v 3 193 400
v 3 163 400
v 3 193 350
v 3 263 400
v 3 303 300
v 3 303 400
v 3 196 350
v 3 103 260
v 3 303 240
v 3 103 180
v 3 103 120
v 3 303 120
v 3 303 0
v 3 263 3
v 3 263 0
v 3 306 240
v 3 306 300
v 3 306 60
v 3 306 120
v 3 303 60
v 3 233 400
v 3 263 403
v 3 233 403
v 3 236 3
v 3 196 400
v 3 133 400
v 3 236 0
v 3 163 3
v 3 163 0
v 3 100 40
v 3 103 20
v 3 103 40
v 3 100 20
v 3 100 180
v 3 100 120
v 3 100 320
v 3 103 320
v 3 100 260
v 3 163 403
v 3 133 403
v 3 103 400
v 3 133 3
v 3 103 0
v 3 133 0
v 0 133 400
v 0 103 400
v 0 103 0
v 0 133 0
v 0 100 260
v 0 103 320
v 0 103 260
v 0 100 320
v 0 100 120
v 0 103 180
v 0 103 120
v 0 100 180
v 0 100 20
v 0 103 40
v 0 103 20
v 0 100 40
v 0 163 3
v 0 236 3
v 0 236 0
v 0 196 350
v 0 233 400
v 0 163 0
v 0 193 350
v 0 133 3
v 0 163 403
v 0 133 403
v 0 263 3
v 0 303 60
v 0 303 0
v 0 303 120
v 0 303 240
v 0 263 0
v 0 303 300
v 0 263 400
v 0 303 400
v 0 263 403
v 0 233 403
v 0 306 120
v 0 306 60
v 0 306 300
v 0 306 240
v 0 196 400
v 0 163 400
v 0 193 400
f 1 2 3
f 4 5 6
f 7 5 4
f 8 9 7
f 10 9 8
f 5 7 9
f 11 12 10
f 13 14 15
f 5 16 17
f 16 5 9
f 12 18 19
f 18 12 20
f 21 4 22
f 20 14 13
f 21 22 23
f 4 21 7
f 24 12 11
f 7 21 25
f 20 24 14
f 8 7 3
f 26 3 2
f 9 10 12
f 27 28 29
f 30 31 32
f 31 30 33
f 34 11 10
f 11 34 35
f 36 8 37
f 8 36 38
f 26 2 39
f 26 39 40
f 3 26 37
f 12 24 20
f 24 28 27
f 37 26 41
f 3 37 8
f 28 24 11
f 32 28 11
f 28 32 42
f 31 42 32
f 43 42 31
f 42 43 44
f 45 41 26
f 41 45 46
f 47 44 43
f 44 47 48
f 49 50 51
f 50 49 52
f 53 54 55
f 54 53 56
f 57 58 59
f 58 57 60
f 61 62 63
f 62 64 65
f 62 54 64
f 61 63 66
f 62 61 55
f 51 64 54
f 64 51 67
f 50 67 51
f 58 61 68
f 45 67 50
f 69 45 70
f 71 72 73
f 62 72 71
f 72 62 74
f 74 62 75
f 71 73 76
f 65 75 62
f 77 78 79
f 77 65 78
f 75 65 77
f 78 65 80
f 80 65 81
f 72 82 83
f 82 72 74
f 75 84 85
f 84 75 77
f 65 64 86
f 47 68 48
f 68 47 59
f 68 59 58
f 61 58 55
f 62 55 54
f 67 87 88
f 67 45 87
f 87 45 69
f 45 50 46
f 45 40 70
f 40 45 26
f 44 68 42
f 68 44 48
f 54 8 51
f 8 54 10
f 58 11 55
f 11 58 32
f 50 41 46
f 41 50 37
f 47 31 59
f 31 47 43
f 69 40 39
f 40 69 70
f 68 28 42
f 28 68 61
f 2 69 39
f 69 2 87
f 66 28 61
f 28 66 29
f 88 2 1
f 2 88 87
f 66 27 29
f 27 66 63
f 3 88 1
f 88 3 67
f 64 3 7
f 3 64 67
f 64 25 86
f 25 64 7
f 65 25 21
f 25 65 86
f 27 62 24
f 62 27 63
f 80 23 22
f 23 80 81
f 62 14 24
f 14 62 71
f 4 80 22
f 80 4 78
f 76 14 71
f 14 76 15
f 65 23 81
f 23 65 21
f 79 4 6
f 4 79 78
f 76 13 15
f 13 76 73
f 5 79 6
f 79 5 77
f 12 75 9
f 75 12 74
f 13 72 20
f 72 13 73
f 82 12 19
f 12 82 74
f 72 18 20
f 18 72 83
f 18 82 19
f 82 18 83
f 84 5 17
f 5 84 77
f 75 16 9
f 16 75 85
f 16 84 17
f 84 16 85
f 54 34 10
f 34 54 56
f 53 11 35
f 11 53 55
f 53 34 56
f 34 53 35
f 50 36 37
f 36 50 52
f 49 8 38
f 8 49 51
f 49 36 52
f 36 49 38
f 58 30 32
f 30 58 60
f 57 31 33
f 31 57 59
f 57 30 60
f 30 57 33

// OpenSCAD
module part03 (){
    // high part
    translate([0,103,0]) color ("red") cube([3,30,400]);
    translate([0,133,3]) color ("red") cube([3,30,400]);
    // middle part
    translate([0,163,0])color("red") cube([3,30,400]);
    //einkerbung
    translate([0,193,0])color("red") cube([3,3,350]);
    translate([0,196,0])color("red") cube([3,40,400]);
    translate([0,233,3])color("red") cube([3,30,400]);
    translate([0,263,0]) color("red") cube([3,40,400]);
    translate([0,303,60])color("red")cube([3,3,60]);
    translate([0,303,240])color("red")cube([3,3,60]);
    translate([0,100,120])color("red")cube([3,3,60]);
    translate([0,100,260])color("red")cube([3,3,60]);
    
    // pin part03a
    translate([0,100,20]) color ("blue") cube([3,3,20]);
}

// to long for printer
part03();
